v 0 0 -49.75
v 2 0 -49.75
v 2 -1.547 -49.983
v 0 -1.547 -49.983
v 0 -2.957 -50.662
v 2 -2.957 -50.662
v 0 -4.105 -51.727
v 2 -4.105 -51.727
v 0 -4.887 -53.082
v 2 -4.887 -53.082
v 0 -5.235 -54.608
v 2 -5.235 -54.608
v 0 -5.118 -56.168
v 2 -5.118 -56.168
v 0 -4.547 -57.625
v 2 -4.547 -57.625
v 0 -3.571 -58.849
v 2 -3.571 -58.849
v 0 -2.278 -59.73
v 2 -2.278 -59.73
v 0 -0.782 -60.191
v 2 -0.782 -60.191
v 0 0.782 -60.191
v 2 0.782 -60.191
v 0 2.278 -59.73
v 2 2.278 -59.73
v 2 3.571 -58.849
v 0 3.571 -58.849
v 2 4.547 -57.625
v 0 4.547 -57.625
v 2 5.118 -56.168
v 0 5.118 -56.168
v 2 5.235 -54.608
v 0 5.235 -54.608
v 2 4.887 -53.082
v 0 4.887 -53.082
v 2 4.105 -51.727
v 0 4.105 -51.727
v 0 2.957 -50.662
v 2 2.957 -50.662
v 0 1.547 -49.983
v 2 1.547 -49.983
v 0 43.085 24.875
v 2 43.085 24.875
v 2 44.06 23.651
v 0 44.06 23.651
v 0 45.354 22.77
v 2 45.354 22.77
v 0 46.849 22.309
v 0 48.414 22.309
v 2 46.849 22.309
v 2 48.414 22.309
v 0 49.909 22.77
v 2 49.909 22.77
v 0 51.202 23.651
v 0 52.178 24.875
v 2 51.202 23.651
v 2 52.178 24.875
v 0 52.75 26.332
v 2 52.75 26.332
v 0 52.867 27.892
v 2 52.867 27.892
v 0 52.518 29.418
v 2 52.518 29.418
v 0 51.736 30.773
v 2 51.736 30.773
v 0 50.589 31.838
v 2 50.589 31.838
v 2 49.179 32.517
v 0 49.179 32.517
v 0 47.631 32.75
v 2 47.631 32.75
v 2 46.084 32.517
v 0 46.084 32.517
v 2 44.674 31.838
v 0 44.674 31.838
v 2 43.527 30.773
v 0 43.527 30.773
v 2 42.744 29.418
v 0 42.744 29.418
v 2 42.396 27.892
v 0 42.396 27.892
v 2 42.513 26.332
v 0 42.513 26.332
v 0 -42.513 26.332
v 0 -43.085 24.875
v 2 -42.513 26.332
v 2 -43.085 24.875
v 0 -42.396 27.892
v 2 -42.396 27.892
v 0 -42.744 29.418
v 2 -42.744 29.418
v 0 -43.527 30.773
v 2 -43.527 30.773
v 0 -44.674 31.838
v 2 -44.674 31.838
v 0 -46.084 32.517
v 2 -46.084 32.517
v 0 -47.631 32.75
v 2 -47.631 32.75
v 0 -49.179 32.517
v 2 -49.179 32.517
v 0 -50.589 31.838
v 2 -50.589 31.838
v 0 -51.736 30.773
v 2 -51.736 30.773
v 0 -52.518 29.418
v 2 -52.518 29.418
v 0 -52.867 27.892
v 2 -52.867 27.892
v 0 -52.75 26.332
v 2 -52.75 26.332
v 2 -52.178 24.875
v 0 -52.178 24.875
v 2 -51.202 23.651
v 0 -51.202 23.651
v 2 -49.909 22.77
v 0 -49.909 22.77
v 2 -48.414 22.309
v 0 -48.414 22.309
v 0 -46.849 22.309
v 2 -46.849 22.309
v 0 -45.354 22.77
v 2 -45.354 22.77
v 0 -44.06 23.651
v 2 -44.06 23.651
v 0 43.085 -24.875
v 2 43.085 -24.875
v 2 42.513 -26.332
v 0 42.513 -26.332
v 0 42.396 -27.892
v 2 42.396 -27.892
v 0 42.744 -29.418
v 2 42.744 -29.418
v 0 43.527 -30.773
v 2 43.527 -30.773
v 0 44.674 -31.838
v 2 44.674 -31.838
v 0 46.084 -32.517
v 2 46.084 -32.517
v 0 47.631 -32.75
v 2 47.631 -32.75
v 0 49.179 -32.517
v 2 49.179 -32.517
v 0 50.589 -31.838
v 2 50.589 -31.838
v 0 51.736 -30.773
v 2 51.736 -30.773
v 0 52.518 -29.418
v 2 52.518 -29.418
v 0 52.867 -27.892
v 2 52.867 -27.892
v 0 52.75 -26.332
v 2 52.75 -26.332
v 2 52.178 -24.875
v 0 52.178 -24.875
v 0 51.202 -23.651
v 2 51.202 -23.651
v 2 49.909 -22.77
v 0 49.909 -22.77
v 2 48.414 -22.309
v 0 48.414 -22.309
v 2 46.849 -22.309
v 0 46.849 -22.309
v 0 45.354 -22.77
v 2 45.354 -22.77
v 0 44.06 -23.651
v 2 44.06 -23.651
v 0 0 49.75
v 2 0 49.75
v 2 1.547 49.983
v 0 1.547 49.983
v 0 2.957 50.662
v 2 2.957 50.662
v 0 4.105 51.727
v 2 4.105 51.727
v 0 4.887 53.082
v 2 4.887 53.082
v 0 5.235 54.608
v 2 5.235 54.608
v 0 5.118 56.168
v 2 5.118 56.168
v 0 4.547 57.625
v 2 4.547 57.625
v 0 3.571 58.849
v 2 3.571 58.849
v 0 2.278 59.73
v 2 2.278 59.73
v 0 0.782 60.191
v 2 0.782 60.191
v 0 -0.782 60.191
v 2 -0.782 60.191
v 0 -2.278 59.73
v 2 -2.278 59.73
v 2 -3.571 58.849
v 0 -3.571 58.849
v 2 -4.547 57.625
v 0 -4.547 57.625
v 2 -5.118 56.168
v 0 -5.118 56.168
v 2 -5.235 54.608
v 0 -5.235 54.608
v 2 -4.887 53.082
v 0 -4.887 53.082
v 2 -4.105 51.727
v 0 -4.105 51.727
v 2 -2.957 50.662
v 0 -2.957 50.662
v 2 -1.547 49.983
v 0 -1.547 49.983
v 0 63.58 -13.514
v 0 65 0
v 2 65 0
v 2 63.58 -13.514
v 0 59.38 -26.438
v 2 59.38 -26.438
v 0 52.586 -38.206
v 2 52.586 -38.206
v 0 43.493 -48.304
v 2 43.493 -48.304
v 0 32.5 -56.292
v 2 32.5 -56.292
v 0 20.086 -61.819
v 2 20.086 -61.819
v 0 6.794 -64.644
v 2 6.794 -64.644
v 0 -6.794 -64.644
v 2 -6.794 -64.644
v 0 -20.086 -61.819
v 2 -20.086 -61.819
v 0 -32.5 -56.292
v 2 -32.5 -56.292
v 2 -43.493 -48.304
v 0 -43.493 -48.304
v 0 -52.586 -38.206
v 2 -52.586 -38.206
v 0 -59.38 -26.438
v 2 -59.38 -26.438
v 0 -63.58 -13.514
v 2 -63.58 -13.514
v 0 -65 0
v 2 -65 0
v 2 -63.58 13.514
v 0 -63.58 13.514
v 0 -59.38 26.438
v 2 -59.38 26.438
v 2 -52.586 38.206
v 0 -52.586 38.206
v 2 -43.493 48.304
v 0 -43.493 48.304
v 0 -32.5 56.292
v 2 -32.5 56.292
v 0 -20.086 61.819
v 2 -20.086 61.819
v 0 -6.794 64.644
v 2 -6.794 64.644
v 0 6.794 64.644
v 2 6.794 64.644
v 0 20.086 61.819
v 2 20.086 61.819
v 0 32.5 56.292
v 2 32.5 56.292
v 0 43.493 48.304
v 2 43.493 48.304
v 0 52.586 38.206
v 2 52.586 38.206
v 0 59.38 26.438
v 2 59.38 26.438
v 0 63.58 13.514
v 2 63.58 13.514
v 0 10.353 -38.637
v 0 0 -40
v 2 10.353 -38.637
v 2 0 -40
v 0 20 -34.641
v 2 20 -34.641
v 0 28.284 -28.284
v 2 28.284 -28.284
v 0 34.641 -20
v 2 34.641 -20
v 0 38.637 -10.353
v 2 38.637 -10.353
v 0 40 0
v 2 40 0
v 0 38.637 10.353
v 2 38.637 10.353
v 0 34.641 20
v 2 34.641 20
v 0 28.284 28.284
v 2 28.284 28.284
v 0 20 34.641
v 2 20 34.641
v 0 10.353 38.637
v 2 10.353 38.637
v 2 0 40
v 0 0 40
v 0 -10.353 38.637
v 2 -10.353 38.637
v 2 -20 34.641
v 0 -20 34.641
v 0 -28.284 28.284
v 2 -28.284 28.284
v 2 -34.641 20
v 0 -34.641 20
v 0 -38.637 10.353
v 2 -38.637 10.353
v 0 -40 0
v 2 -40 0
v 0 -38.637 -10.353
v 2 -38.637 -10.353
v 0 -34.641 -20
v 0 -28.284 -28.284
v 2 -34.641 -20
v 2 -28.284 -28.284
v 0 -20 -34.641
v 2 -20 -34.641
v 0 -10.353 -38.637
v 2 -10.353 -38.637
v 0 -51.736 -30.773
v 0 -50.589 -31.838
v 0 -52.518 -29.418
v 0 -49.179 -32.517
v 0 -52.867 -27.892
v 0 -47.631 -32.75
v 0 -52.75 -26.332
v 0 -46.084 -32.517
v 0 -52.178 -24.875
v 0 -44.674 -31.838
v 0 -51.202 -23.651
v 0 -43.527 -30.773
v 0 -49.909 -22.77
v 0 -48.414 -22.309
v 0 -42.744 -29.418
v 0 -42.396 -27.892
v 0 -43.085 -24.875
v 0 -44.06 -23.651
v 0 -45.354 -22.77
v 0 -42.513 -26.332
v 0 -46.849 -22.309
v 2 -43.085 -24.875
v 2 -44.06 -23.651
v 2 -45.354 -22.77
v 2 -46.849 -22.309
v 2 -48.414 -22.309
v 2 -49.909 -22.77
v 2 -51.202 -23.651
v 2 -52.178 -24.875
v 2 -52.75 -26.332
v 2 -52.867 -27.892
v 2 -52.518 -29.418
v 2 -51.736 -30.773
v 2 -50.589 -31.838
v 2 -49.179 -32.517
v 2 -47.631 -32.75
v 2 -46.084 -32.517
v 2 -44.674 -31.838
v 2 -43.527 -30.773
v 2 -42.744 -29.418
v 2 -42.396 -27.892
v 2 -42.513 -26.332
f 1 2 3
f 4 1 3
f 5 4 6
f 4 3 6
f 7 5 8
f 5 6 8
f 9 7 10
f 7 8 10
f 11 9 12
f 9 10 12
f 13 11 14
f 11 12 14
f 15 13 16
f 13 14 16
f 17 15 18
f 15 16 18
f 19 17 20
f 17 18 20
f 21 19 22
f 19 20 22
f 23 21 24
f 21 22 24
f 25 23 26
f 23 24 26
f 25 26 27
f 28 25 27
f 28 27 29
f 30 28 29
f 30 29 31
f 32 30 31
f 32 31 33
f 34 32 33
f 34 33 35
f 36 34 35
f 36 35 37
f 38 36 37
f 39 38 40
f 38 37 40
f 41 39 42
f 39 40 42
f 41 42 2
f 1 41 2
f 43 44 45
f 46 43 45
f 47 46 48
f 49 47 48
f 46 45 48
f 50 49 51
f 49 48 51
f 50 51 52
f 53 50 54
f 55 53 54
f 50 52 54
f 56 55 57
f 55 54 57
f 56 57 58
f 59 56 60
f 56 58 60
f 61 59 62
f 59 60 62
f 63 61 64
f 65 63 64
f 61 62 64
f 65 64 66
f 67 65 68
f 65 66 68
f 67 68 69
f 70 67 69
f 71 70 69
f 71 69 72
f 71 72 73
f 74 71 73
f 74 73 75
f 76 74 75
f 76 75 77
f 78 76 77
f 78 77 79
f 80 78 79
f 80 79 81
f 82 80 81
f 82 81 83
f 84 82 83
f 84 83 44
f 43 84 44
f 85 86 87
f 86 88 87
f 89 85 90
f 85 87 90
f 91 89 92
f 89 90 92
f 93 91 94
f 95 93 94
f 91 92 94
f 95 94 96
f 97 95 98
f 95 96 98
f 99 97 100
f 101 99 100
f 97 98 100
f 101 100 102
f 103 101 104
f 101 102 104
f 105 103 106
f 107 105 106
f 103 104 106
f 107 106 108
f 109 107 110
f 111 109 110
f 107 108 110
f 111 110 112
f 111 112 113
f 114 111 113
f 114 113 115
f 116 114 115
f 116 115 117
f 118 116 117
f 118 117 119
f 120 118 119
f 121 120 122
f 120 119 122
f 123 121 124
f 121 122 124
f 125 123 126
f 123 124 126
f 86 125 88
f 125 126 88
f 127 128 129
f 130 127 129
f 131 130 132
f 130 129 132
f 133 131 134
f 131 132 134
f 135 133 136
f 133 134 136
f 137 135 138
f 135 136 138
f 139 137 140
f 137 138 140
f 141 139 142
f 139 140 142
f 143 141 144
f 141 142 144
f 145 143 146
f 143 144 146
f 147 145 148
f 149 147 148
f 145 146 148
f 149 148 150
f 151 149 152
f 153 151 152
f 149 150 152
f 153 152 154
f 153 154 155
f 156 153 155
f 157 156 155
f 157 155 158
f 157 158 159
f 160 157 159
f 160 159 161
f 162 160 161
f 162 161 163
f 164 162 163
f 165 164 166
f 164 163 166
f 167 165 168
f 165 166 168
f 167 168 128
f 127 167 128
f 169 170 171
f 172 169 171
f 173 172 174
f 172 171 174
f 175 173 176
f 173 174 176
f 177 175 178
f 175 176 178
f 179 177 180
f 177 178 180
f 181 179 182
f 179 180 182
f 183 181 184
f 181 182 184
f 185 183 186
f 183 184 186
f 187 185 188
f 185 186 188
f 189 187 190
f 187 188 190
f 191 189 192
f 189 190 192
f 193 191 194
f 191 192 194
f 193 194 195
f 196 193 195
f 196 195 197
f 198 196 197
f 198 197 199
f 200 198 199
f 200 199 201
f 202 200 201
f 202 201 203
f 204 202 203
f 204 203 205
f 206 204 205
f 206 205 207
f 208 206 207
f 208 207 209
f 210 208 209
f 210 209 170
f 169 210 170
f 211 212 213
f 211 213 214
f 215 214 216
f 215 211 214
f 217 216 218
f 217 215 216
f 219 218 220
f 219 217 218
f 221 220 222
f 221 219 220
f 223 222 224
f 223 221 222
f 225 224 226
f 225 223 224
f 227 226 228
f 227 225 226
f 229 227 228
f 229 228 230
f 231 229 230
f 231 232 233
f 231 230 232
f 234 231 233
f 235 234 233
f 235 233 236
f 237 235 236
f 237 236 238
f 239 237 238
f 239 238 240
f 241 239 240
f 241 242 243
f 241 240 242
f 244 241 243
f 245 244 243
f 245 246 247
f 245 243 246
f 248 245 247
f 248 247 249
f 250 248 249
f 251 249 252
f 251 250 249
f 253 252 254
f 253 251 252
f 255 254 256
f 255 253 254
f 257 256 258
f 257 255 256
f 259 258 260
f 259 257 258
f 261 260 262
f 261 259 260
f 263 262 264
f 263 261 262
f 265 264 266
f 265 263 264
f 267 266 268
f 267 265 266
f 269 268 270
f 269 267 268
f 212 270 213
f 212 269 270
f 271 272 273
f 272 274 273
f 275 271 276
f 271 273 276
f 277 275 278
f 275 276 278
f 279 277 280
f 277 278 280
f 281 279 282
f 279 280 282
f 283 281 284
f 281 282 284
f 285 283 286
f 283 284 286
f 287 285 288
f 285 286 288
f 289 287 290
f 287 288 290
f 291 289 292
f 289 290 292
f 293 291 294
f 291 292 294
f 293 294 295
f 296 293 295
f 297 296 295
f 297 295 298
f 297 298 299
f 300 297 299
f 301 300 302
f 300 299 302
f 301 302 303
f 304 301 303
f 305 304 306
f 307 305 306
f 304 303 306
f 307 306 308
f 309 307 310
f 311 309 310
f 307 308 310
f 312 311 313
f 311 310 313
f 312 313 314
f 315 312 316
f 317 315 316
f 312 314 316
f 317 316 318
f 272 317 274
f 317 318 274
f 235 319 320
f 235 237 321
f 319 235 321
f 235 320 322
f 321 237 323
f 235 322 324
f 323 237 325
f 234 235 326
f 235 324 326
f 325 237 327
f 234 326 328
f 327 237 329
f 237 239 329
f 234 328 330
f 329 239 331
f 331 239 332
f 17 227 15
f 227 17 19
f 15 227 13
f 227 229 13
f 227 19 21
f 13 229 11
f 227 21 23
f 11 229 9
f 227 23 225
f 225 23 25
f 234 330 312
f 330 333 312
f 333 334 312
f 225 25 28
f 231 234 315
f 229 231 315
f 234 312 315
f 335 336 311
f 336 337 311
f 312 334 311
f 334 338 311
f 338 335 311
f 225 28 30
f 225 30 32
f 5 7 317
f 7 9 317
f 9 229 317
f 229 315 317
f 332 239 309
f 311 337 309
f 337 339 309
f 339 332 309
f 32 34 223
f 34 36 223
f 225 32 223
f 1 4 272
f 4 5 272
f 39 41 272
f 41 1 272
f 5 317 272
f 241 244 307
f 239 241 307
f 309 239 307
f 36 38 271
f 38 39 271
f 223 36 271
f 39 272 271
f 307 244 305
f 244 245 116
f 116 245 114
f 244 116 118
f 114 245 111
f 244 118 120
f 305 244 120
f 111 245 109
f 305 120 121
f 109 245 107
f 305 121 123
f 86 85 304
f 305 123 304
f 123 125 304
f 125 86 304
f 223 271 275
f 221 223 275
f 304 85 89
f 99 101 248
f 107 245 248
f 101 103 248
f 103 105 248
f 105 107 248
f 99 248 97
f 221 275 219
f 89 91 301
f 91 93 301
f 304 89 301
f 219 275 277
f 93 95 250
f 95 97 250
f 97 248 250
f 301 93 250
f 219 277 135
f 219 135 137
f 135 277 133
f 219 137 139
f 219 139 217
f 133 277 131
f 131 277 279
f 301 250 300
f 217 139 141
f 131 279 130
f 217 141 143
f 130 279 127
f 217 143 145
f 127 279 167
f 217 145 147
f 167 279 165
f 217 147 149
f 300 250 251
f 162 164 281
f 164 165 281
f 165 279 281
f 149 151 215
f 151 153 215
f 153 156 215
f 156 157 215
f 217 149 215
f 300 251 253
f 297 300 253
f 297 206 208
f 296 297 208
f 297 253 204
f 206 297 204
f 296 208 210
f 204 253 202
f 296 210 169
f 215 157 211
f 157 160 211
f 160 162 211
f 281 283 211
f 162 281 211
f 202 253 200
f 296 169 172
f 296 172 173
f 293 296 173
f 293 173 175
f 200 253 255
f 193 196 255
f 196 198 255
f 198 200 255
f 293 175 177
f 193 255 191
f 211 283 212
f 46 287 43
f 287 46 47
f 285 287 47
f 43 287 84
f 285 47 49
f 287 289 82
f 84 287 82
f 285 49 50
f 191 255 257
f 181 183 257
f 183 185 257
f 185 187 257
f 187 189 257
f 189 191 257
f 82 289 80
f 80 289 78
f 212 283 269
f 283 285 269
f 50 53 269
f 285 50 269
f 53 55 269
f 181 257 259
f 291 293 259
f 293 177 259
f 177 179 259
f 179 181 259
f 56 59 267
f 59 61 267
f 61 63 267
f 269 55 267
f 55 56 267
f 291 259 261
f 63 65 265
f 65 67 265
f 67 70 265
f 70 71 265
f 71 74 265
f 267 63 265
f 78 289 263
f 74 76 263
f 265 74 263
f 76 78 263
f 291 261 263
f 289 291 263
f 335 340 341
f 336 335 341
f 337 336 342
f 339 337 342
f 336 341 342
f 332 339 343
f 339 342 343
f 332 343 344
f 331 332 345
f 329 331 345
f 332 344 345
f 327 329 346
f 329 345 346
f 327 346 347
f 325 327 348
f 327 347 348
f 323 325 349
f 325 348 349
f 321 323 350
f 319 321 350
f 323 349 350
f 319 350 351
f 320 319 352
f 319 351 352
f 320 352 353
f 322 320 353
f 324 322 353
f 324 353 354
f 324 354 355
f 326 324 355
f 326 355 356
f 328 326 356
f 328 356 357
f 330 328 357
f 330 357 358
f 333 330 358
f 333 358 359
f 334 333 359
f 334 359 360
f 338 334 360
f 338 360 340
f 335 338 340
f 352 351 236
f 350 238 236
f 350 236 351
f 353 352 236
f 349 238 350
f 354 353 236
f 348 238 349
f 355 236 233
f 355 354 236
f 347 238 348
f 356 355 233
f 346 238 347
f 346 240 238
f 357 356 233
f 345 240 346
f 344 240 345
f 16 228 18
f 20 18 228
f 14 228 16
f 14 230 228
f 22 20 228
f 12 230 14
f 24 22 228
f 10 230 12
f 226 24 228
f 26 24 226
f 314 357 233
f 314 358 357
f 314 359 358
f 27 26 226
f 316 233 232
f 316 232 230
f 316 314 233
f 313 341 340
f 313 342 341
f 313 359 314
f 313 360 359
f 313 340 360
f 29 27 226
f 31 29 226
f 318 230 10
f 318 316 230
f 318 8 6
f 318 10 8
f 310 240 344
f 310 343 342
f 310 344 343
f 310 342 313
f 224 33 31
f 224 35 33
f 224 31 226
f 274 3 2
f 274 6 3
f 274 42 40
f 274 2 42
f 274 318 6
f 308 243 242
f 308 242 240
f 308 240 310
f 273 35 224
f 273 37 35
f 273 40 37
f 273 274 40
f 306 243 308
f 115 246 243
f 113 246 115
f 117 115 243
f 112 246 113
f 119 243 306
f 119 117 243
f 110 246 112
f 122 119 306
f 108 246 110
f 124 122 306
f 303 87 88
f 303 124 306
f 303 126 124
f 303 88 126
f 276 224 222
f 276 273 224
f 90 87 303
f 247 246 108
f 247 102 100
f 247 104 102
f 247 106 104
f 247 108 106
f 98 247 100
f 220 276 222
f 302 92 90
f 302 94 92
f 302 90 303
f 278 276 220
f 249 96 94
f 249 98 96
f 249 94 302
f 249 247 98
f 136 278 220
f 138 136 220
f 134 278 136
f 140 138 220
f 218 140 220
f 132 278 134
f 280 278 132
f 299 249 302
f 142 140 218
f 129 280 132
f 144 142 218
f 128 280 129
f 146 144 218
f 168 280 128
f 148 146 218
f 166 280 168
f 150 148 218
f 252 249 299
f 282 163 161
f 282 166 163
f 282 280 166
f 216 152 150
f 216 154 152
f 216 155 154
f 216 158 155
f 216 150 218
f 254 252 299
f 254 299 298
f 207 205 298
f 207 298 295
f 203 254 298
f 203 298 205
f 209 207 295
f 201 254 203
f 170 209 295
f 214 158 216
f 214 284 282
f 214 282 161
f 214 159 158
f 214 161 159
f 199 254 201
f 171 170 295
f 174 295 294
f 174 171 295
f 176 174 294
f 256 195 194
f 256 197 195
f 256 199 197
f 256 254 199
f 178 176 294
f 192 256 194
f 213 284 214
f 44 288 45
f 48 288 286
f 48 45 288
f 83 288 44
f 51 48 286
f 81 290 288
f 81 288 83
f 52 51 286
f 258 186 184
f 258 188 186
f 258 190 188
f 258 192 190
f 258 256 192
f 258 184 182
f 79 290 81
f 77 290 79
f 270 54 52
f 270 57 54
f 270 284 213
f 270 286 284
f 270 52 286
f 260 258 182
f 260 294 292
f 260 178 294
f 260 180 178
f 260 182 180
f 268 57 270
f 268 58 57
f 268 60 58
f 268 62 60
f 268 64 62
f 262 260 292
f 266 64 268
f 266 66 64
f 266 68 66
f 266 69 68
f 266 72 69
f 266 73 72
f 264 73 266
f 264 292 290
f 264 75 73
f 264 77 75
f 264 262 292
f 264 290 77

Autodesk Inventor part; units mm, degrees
ref_plane "YZ Plane" through (0, 0, 0) normal (1, 0, 0) x (0, 1, 0)
ref_plane "XZ Plane" through (0, 0, 0) normal (0, 1, 0) x (-1, 0, 0)
ref_plane "XY Plane" through (0, 0, 0) normal (0, 0, 1) x (1, 0, 0)
sketch "Sketch1" plane through (0, 0, 0) normal (1, 0, 0) x (0, 1, 0)
  circle A0 centre (0, 0) radius 65
  dimension "d0" = 130
extrude "Extrusion1" add sketch "Sketch1" along normal blind 2
sketch "Sketch2" plane through (0, 0, 0) normal (-1, 0, 0) x (0, 0, 1)
  circle A0 centre (0, 0) radius 55
  circle A1 centre (-55, 0) radius 5.25
  dimension "d3" = 110
  dimension "d4" = 10.5
hole "Hole1" at (0, 0, -55) direction (1, 0, 0) diameter 10.5 end through all
pattern_circular "Circular Pattern1" count 6 over 360 about axis through (0, 0, 0) along (1, 0, 0) of "Hole1"
sketch "Sketch3" plane through (2, 0, 0) normal (1, 0, 0) x (0, 0, -1)
  circle A0 centre (0, 0) radius 40
  dimension "d15" = 80
extrude "Extrusion2" cut sketch "Sketch3" against normal blind 10
properties part number "08_Dem_dieu_chinh"
